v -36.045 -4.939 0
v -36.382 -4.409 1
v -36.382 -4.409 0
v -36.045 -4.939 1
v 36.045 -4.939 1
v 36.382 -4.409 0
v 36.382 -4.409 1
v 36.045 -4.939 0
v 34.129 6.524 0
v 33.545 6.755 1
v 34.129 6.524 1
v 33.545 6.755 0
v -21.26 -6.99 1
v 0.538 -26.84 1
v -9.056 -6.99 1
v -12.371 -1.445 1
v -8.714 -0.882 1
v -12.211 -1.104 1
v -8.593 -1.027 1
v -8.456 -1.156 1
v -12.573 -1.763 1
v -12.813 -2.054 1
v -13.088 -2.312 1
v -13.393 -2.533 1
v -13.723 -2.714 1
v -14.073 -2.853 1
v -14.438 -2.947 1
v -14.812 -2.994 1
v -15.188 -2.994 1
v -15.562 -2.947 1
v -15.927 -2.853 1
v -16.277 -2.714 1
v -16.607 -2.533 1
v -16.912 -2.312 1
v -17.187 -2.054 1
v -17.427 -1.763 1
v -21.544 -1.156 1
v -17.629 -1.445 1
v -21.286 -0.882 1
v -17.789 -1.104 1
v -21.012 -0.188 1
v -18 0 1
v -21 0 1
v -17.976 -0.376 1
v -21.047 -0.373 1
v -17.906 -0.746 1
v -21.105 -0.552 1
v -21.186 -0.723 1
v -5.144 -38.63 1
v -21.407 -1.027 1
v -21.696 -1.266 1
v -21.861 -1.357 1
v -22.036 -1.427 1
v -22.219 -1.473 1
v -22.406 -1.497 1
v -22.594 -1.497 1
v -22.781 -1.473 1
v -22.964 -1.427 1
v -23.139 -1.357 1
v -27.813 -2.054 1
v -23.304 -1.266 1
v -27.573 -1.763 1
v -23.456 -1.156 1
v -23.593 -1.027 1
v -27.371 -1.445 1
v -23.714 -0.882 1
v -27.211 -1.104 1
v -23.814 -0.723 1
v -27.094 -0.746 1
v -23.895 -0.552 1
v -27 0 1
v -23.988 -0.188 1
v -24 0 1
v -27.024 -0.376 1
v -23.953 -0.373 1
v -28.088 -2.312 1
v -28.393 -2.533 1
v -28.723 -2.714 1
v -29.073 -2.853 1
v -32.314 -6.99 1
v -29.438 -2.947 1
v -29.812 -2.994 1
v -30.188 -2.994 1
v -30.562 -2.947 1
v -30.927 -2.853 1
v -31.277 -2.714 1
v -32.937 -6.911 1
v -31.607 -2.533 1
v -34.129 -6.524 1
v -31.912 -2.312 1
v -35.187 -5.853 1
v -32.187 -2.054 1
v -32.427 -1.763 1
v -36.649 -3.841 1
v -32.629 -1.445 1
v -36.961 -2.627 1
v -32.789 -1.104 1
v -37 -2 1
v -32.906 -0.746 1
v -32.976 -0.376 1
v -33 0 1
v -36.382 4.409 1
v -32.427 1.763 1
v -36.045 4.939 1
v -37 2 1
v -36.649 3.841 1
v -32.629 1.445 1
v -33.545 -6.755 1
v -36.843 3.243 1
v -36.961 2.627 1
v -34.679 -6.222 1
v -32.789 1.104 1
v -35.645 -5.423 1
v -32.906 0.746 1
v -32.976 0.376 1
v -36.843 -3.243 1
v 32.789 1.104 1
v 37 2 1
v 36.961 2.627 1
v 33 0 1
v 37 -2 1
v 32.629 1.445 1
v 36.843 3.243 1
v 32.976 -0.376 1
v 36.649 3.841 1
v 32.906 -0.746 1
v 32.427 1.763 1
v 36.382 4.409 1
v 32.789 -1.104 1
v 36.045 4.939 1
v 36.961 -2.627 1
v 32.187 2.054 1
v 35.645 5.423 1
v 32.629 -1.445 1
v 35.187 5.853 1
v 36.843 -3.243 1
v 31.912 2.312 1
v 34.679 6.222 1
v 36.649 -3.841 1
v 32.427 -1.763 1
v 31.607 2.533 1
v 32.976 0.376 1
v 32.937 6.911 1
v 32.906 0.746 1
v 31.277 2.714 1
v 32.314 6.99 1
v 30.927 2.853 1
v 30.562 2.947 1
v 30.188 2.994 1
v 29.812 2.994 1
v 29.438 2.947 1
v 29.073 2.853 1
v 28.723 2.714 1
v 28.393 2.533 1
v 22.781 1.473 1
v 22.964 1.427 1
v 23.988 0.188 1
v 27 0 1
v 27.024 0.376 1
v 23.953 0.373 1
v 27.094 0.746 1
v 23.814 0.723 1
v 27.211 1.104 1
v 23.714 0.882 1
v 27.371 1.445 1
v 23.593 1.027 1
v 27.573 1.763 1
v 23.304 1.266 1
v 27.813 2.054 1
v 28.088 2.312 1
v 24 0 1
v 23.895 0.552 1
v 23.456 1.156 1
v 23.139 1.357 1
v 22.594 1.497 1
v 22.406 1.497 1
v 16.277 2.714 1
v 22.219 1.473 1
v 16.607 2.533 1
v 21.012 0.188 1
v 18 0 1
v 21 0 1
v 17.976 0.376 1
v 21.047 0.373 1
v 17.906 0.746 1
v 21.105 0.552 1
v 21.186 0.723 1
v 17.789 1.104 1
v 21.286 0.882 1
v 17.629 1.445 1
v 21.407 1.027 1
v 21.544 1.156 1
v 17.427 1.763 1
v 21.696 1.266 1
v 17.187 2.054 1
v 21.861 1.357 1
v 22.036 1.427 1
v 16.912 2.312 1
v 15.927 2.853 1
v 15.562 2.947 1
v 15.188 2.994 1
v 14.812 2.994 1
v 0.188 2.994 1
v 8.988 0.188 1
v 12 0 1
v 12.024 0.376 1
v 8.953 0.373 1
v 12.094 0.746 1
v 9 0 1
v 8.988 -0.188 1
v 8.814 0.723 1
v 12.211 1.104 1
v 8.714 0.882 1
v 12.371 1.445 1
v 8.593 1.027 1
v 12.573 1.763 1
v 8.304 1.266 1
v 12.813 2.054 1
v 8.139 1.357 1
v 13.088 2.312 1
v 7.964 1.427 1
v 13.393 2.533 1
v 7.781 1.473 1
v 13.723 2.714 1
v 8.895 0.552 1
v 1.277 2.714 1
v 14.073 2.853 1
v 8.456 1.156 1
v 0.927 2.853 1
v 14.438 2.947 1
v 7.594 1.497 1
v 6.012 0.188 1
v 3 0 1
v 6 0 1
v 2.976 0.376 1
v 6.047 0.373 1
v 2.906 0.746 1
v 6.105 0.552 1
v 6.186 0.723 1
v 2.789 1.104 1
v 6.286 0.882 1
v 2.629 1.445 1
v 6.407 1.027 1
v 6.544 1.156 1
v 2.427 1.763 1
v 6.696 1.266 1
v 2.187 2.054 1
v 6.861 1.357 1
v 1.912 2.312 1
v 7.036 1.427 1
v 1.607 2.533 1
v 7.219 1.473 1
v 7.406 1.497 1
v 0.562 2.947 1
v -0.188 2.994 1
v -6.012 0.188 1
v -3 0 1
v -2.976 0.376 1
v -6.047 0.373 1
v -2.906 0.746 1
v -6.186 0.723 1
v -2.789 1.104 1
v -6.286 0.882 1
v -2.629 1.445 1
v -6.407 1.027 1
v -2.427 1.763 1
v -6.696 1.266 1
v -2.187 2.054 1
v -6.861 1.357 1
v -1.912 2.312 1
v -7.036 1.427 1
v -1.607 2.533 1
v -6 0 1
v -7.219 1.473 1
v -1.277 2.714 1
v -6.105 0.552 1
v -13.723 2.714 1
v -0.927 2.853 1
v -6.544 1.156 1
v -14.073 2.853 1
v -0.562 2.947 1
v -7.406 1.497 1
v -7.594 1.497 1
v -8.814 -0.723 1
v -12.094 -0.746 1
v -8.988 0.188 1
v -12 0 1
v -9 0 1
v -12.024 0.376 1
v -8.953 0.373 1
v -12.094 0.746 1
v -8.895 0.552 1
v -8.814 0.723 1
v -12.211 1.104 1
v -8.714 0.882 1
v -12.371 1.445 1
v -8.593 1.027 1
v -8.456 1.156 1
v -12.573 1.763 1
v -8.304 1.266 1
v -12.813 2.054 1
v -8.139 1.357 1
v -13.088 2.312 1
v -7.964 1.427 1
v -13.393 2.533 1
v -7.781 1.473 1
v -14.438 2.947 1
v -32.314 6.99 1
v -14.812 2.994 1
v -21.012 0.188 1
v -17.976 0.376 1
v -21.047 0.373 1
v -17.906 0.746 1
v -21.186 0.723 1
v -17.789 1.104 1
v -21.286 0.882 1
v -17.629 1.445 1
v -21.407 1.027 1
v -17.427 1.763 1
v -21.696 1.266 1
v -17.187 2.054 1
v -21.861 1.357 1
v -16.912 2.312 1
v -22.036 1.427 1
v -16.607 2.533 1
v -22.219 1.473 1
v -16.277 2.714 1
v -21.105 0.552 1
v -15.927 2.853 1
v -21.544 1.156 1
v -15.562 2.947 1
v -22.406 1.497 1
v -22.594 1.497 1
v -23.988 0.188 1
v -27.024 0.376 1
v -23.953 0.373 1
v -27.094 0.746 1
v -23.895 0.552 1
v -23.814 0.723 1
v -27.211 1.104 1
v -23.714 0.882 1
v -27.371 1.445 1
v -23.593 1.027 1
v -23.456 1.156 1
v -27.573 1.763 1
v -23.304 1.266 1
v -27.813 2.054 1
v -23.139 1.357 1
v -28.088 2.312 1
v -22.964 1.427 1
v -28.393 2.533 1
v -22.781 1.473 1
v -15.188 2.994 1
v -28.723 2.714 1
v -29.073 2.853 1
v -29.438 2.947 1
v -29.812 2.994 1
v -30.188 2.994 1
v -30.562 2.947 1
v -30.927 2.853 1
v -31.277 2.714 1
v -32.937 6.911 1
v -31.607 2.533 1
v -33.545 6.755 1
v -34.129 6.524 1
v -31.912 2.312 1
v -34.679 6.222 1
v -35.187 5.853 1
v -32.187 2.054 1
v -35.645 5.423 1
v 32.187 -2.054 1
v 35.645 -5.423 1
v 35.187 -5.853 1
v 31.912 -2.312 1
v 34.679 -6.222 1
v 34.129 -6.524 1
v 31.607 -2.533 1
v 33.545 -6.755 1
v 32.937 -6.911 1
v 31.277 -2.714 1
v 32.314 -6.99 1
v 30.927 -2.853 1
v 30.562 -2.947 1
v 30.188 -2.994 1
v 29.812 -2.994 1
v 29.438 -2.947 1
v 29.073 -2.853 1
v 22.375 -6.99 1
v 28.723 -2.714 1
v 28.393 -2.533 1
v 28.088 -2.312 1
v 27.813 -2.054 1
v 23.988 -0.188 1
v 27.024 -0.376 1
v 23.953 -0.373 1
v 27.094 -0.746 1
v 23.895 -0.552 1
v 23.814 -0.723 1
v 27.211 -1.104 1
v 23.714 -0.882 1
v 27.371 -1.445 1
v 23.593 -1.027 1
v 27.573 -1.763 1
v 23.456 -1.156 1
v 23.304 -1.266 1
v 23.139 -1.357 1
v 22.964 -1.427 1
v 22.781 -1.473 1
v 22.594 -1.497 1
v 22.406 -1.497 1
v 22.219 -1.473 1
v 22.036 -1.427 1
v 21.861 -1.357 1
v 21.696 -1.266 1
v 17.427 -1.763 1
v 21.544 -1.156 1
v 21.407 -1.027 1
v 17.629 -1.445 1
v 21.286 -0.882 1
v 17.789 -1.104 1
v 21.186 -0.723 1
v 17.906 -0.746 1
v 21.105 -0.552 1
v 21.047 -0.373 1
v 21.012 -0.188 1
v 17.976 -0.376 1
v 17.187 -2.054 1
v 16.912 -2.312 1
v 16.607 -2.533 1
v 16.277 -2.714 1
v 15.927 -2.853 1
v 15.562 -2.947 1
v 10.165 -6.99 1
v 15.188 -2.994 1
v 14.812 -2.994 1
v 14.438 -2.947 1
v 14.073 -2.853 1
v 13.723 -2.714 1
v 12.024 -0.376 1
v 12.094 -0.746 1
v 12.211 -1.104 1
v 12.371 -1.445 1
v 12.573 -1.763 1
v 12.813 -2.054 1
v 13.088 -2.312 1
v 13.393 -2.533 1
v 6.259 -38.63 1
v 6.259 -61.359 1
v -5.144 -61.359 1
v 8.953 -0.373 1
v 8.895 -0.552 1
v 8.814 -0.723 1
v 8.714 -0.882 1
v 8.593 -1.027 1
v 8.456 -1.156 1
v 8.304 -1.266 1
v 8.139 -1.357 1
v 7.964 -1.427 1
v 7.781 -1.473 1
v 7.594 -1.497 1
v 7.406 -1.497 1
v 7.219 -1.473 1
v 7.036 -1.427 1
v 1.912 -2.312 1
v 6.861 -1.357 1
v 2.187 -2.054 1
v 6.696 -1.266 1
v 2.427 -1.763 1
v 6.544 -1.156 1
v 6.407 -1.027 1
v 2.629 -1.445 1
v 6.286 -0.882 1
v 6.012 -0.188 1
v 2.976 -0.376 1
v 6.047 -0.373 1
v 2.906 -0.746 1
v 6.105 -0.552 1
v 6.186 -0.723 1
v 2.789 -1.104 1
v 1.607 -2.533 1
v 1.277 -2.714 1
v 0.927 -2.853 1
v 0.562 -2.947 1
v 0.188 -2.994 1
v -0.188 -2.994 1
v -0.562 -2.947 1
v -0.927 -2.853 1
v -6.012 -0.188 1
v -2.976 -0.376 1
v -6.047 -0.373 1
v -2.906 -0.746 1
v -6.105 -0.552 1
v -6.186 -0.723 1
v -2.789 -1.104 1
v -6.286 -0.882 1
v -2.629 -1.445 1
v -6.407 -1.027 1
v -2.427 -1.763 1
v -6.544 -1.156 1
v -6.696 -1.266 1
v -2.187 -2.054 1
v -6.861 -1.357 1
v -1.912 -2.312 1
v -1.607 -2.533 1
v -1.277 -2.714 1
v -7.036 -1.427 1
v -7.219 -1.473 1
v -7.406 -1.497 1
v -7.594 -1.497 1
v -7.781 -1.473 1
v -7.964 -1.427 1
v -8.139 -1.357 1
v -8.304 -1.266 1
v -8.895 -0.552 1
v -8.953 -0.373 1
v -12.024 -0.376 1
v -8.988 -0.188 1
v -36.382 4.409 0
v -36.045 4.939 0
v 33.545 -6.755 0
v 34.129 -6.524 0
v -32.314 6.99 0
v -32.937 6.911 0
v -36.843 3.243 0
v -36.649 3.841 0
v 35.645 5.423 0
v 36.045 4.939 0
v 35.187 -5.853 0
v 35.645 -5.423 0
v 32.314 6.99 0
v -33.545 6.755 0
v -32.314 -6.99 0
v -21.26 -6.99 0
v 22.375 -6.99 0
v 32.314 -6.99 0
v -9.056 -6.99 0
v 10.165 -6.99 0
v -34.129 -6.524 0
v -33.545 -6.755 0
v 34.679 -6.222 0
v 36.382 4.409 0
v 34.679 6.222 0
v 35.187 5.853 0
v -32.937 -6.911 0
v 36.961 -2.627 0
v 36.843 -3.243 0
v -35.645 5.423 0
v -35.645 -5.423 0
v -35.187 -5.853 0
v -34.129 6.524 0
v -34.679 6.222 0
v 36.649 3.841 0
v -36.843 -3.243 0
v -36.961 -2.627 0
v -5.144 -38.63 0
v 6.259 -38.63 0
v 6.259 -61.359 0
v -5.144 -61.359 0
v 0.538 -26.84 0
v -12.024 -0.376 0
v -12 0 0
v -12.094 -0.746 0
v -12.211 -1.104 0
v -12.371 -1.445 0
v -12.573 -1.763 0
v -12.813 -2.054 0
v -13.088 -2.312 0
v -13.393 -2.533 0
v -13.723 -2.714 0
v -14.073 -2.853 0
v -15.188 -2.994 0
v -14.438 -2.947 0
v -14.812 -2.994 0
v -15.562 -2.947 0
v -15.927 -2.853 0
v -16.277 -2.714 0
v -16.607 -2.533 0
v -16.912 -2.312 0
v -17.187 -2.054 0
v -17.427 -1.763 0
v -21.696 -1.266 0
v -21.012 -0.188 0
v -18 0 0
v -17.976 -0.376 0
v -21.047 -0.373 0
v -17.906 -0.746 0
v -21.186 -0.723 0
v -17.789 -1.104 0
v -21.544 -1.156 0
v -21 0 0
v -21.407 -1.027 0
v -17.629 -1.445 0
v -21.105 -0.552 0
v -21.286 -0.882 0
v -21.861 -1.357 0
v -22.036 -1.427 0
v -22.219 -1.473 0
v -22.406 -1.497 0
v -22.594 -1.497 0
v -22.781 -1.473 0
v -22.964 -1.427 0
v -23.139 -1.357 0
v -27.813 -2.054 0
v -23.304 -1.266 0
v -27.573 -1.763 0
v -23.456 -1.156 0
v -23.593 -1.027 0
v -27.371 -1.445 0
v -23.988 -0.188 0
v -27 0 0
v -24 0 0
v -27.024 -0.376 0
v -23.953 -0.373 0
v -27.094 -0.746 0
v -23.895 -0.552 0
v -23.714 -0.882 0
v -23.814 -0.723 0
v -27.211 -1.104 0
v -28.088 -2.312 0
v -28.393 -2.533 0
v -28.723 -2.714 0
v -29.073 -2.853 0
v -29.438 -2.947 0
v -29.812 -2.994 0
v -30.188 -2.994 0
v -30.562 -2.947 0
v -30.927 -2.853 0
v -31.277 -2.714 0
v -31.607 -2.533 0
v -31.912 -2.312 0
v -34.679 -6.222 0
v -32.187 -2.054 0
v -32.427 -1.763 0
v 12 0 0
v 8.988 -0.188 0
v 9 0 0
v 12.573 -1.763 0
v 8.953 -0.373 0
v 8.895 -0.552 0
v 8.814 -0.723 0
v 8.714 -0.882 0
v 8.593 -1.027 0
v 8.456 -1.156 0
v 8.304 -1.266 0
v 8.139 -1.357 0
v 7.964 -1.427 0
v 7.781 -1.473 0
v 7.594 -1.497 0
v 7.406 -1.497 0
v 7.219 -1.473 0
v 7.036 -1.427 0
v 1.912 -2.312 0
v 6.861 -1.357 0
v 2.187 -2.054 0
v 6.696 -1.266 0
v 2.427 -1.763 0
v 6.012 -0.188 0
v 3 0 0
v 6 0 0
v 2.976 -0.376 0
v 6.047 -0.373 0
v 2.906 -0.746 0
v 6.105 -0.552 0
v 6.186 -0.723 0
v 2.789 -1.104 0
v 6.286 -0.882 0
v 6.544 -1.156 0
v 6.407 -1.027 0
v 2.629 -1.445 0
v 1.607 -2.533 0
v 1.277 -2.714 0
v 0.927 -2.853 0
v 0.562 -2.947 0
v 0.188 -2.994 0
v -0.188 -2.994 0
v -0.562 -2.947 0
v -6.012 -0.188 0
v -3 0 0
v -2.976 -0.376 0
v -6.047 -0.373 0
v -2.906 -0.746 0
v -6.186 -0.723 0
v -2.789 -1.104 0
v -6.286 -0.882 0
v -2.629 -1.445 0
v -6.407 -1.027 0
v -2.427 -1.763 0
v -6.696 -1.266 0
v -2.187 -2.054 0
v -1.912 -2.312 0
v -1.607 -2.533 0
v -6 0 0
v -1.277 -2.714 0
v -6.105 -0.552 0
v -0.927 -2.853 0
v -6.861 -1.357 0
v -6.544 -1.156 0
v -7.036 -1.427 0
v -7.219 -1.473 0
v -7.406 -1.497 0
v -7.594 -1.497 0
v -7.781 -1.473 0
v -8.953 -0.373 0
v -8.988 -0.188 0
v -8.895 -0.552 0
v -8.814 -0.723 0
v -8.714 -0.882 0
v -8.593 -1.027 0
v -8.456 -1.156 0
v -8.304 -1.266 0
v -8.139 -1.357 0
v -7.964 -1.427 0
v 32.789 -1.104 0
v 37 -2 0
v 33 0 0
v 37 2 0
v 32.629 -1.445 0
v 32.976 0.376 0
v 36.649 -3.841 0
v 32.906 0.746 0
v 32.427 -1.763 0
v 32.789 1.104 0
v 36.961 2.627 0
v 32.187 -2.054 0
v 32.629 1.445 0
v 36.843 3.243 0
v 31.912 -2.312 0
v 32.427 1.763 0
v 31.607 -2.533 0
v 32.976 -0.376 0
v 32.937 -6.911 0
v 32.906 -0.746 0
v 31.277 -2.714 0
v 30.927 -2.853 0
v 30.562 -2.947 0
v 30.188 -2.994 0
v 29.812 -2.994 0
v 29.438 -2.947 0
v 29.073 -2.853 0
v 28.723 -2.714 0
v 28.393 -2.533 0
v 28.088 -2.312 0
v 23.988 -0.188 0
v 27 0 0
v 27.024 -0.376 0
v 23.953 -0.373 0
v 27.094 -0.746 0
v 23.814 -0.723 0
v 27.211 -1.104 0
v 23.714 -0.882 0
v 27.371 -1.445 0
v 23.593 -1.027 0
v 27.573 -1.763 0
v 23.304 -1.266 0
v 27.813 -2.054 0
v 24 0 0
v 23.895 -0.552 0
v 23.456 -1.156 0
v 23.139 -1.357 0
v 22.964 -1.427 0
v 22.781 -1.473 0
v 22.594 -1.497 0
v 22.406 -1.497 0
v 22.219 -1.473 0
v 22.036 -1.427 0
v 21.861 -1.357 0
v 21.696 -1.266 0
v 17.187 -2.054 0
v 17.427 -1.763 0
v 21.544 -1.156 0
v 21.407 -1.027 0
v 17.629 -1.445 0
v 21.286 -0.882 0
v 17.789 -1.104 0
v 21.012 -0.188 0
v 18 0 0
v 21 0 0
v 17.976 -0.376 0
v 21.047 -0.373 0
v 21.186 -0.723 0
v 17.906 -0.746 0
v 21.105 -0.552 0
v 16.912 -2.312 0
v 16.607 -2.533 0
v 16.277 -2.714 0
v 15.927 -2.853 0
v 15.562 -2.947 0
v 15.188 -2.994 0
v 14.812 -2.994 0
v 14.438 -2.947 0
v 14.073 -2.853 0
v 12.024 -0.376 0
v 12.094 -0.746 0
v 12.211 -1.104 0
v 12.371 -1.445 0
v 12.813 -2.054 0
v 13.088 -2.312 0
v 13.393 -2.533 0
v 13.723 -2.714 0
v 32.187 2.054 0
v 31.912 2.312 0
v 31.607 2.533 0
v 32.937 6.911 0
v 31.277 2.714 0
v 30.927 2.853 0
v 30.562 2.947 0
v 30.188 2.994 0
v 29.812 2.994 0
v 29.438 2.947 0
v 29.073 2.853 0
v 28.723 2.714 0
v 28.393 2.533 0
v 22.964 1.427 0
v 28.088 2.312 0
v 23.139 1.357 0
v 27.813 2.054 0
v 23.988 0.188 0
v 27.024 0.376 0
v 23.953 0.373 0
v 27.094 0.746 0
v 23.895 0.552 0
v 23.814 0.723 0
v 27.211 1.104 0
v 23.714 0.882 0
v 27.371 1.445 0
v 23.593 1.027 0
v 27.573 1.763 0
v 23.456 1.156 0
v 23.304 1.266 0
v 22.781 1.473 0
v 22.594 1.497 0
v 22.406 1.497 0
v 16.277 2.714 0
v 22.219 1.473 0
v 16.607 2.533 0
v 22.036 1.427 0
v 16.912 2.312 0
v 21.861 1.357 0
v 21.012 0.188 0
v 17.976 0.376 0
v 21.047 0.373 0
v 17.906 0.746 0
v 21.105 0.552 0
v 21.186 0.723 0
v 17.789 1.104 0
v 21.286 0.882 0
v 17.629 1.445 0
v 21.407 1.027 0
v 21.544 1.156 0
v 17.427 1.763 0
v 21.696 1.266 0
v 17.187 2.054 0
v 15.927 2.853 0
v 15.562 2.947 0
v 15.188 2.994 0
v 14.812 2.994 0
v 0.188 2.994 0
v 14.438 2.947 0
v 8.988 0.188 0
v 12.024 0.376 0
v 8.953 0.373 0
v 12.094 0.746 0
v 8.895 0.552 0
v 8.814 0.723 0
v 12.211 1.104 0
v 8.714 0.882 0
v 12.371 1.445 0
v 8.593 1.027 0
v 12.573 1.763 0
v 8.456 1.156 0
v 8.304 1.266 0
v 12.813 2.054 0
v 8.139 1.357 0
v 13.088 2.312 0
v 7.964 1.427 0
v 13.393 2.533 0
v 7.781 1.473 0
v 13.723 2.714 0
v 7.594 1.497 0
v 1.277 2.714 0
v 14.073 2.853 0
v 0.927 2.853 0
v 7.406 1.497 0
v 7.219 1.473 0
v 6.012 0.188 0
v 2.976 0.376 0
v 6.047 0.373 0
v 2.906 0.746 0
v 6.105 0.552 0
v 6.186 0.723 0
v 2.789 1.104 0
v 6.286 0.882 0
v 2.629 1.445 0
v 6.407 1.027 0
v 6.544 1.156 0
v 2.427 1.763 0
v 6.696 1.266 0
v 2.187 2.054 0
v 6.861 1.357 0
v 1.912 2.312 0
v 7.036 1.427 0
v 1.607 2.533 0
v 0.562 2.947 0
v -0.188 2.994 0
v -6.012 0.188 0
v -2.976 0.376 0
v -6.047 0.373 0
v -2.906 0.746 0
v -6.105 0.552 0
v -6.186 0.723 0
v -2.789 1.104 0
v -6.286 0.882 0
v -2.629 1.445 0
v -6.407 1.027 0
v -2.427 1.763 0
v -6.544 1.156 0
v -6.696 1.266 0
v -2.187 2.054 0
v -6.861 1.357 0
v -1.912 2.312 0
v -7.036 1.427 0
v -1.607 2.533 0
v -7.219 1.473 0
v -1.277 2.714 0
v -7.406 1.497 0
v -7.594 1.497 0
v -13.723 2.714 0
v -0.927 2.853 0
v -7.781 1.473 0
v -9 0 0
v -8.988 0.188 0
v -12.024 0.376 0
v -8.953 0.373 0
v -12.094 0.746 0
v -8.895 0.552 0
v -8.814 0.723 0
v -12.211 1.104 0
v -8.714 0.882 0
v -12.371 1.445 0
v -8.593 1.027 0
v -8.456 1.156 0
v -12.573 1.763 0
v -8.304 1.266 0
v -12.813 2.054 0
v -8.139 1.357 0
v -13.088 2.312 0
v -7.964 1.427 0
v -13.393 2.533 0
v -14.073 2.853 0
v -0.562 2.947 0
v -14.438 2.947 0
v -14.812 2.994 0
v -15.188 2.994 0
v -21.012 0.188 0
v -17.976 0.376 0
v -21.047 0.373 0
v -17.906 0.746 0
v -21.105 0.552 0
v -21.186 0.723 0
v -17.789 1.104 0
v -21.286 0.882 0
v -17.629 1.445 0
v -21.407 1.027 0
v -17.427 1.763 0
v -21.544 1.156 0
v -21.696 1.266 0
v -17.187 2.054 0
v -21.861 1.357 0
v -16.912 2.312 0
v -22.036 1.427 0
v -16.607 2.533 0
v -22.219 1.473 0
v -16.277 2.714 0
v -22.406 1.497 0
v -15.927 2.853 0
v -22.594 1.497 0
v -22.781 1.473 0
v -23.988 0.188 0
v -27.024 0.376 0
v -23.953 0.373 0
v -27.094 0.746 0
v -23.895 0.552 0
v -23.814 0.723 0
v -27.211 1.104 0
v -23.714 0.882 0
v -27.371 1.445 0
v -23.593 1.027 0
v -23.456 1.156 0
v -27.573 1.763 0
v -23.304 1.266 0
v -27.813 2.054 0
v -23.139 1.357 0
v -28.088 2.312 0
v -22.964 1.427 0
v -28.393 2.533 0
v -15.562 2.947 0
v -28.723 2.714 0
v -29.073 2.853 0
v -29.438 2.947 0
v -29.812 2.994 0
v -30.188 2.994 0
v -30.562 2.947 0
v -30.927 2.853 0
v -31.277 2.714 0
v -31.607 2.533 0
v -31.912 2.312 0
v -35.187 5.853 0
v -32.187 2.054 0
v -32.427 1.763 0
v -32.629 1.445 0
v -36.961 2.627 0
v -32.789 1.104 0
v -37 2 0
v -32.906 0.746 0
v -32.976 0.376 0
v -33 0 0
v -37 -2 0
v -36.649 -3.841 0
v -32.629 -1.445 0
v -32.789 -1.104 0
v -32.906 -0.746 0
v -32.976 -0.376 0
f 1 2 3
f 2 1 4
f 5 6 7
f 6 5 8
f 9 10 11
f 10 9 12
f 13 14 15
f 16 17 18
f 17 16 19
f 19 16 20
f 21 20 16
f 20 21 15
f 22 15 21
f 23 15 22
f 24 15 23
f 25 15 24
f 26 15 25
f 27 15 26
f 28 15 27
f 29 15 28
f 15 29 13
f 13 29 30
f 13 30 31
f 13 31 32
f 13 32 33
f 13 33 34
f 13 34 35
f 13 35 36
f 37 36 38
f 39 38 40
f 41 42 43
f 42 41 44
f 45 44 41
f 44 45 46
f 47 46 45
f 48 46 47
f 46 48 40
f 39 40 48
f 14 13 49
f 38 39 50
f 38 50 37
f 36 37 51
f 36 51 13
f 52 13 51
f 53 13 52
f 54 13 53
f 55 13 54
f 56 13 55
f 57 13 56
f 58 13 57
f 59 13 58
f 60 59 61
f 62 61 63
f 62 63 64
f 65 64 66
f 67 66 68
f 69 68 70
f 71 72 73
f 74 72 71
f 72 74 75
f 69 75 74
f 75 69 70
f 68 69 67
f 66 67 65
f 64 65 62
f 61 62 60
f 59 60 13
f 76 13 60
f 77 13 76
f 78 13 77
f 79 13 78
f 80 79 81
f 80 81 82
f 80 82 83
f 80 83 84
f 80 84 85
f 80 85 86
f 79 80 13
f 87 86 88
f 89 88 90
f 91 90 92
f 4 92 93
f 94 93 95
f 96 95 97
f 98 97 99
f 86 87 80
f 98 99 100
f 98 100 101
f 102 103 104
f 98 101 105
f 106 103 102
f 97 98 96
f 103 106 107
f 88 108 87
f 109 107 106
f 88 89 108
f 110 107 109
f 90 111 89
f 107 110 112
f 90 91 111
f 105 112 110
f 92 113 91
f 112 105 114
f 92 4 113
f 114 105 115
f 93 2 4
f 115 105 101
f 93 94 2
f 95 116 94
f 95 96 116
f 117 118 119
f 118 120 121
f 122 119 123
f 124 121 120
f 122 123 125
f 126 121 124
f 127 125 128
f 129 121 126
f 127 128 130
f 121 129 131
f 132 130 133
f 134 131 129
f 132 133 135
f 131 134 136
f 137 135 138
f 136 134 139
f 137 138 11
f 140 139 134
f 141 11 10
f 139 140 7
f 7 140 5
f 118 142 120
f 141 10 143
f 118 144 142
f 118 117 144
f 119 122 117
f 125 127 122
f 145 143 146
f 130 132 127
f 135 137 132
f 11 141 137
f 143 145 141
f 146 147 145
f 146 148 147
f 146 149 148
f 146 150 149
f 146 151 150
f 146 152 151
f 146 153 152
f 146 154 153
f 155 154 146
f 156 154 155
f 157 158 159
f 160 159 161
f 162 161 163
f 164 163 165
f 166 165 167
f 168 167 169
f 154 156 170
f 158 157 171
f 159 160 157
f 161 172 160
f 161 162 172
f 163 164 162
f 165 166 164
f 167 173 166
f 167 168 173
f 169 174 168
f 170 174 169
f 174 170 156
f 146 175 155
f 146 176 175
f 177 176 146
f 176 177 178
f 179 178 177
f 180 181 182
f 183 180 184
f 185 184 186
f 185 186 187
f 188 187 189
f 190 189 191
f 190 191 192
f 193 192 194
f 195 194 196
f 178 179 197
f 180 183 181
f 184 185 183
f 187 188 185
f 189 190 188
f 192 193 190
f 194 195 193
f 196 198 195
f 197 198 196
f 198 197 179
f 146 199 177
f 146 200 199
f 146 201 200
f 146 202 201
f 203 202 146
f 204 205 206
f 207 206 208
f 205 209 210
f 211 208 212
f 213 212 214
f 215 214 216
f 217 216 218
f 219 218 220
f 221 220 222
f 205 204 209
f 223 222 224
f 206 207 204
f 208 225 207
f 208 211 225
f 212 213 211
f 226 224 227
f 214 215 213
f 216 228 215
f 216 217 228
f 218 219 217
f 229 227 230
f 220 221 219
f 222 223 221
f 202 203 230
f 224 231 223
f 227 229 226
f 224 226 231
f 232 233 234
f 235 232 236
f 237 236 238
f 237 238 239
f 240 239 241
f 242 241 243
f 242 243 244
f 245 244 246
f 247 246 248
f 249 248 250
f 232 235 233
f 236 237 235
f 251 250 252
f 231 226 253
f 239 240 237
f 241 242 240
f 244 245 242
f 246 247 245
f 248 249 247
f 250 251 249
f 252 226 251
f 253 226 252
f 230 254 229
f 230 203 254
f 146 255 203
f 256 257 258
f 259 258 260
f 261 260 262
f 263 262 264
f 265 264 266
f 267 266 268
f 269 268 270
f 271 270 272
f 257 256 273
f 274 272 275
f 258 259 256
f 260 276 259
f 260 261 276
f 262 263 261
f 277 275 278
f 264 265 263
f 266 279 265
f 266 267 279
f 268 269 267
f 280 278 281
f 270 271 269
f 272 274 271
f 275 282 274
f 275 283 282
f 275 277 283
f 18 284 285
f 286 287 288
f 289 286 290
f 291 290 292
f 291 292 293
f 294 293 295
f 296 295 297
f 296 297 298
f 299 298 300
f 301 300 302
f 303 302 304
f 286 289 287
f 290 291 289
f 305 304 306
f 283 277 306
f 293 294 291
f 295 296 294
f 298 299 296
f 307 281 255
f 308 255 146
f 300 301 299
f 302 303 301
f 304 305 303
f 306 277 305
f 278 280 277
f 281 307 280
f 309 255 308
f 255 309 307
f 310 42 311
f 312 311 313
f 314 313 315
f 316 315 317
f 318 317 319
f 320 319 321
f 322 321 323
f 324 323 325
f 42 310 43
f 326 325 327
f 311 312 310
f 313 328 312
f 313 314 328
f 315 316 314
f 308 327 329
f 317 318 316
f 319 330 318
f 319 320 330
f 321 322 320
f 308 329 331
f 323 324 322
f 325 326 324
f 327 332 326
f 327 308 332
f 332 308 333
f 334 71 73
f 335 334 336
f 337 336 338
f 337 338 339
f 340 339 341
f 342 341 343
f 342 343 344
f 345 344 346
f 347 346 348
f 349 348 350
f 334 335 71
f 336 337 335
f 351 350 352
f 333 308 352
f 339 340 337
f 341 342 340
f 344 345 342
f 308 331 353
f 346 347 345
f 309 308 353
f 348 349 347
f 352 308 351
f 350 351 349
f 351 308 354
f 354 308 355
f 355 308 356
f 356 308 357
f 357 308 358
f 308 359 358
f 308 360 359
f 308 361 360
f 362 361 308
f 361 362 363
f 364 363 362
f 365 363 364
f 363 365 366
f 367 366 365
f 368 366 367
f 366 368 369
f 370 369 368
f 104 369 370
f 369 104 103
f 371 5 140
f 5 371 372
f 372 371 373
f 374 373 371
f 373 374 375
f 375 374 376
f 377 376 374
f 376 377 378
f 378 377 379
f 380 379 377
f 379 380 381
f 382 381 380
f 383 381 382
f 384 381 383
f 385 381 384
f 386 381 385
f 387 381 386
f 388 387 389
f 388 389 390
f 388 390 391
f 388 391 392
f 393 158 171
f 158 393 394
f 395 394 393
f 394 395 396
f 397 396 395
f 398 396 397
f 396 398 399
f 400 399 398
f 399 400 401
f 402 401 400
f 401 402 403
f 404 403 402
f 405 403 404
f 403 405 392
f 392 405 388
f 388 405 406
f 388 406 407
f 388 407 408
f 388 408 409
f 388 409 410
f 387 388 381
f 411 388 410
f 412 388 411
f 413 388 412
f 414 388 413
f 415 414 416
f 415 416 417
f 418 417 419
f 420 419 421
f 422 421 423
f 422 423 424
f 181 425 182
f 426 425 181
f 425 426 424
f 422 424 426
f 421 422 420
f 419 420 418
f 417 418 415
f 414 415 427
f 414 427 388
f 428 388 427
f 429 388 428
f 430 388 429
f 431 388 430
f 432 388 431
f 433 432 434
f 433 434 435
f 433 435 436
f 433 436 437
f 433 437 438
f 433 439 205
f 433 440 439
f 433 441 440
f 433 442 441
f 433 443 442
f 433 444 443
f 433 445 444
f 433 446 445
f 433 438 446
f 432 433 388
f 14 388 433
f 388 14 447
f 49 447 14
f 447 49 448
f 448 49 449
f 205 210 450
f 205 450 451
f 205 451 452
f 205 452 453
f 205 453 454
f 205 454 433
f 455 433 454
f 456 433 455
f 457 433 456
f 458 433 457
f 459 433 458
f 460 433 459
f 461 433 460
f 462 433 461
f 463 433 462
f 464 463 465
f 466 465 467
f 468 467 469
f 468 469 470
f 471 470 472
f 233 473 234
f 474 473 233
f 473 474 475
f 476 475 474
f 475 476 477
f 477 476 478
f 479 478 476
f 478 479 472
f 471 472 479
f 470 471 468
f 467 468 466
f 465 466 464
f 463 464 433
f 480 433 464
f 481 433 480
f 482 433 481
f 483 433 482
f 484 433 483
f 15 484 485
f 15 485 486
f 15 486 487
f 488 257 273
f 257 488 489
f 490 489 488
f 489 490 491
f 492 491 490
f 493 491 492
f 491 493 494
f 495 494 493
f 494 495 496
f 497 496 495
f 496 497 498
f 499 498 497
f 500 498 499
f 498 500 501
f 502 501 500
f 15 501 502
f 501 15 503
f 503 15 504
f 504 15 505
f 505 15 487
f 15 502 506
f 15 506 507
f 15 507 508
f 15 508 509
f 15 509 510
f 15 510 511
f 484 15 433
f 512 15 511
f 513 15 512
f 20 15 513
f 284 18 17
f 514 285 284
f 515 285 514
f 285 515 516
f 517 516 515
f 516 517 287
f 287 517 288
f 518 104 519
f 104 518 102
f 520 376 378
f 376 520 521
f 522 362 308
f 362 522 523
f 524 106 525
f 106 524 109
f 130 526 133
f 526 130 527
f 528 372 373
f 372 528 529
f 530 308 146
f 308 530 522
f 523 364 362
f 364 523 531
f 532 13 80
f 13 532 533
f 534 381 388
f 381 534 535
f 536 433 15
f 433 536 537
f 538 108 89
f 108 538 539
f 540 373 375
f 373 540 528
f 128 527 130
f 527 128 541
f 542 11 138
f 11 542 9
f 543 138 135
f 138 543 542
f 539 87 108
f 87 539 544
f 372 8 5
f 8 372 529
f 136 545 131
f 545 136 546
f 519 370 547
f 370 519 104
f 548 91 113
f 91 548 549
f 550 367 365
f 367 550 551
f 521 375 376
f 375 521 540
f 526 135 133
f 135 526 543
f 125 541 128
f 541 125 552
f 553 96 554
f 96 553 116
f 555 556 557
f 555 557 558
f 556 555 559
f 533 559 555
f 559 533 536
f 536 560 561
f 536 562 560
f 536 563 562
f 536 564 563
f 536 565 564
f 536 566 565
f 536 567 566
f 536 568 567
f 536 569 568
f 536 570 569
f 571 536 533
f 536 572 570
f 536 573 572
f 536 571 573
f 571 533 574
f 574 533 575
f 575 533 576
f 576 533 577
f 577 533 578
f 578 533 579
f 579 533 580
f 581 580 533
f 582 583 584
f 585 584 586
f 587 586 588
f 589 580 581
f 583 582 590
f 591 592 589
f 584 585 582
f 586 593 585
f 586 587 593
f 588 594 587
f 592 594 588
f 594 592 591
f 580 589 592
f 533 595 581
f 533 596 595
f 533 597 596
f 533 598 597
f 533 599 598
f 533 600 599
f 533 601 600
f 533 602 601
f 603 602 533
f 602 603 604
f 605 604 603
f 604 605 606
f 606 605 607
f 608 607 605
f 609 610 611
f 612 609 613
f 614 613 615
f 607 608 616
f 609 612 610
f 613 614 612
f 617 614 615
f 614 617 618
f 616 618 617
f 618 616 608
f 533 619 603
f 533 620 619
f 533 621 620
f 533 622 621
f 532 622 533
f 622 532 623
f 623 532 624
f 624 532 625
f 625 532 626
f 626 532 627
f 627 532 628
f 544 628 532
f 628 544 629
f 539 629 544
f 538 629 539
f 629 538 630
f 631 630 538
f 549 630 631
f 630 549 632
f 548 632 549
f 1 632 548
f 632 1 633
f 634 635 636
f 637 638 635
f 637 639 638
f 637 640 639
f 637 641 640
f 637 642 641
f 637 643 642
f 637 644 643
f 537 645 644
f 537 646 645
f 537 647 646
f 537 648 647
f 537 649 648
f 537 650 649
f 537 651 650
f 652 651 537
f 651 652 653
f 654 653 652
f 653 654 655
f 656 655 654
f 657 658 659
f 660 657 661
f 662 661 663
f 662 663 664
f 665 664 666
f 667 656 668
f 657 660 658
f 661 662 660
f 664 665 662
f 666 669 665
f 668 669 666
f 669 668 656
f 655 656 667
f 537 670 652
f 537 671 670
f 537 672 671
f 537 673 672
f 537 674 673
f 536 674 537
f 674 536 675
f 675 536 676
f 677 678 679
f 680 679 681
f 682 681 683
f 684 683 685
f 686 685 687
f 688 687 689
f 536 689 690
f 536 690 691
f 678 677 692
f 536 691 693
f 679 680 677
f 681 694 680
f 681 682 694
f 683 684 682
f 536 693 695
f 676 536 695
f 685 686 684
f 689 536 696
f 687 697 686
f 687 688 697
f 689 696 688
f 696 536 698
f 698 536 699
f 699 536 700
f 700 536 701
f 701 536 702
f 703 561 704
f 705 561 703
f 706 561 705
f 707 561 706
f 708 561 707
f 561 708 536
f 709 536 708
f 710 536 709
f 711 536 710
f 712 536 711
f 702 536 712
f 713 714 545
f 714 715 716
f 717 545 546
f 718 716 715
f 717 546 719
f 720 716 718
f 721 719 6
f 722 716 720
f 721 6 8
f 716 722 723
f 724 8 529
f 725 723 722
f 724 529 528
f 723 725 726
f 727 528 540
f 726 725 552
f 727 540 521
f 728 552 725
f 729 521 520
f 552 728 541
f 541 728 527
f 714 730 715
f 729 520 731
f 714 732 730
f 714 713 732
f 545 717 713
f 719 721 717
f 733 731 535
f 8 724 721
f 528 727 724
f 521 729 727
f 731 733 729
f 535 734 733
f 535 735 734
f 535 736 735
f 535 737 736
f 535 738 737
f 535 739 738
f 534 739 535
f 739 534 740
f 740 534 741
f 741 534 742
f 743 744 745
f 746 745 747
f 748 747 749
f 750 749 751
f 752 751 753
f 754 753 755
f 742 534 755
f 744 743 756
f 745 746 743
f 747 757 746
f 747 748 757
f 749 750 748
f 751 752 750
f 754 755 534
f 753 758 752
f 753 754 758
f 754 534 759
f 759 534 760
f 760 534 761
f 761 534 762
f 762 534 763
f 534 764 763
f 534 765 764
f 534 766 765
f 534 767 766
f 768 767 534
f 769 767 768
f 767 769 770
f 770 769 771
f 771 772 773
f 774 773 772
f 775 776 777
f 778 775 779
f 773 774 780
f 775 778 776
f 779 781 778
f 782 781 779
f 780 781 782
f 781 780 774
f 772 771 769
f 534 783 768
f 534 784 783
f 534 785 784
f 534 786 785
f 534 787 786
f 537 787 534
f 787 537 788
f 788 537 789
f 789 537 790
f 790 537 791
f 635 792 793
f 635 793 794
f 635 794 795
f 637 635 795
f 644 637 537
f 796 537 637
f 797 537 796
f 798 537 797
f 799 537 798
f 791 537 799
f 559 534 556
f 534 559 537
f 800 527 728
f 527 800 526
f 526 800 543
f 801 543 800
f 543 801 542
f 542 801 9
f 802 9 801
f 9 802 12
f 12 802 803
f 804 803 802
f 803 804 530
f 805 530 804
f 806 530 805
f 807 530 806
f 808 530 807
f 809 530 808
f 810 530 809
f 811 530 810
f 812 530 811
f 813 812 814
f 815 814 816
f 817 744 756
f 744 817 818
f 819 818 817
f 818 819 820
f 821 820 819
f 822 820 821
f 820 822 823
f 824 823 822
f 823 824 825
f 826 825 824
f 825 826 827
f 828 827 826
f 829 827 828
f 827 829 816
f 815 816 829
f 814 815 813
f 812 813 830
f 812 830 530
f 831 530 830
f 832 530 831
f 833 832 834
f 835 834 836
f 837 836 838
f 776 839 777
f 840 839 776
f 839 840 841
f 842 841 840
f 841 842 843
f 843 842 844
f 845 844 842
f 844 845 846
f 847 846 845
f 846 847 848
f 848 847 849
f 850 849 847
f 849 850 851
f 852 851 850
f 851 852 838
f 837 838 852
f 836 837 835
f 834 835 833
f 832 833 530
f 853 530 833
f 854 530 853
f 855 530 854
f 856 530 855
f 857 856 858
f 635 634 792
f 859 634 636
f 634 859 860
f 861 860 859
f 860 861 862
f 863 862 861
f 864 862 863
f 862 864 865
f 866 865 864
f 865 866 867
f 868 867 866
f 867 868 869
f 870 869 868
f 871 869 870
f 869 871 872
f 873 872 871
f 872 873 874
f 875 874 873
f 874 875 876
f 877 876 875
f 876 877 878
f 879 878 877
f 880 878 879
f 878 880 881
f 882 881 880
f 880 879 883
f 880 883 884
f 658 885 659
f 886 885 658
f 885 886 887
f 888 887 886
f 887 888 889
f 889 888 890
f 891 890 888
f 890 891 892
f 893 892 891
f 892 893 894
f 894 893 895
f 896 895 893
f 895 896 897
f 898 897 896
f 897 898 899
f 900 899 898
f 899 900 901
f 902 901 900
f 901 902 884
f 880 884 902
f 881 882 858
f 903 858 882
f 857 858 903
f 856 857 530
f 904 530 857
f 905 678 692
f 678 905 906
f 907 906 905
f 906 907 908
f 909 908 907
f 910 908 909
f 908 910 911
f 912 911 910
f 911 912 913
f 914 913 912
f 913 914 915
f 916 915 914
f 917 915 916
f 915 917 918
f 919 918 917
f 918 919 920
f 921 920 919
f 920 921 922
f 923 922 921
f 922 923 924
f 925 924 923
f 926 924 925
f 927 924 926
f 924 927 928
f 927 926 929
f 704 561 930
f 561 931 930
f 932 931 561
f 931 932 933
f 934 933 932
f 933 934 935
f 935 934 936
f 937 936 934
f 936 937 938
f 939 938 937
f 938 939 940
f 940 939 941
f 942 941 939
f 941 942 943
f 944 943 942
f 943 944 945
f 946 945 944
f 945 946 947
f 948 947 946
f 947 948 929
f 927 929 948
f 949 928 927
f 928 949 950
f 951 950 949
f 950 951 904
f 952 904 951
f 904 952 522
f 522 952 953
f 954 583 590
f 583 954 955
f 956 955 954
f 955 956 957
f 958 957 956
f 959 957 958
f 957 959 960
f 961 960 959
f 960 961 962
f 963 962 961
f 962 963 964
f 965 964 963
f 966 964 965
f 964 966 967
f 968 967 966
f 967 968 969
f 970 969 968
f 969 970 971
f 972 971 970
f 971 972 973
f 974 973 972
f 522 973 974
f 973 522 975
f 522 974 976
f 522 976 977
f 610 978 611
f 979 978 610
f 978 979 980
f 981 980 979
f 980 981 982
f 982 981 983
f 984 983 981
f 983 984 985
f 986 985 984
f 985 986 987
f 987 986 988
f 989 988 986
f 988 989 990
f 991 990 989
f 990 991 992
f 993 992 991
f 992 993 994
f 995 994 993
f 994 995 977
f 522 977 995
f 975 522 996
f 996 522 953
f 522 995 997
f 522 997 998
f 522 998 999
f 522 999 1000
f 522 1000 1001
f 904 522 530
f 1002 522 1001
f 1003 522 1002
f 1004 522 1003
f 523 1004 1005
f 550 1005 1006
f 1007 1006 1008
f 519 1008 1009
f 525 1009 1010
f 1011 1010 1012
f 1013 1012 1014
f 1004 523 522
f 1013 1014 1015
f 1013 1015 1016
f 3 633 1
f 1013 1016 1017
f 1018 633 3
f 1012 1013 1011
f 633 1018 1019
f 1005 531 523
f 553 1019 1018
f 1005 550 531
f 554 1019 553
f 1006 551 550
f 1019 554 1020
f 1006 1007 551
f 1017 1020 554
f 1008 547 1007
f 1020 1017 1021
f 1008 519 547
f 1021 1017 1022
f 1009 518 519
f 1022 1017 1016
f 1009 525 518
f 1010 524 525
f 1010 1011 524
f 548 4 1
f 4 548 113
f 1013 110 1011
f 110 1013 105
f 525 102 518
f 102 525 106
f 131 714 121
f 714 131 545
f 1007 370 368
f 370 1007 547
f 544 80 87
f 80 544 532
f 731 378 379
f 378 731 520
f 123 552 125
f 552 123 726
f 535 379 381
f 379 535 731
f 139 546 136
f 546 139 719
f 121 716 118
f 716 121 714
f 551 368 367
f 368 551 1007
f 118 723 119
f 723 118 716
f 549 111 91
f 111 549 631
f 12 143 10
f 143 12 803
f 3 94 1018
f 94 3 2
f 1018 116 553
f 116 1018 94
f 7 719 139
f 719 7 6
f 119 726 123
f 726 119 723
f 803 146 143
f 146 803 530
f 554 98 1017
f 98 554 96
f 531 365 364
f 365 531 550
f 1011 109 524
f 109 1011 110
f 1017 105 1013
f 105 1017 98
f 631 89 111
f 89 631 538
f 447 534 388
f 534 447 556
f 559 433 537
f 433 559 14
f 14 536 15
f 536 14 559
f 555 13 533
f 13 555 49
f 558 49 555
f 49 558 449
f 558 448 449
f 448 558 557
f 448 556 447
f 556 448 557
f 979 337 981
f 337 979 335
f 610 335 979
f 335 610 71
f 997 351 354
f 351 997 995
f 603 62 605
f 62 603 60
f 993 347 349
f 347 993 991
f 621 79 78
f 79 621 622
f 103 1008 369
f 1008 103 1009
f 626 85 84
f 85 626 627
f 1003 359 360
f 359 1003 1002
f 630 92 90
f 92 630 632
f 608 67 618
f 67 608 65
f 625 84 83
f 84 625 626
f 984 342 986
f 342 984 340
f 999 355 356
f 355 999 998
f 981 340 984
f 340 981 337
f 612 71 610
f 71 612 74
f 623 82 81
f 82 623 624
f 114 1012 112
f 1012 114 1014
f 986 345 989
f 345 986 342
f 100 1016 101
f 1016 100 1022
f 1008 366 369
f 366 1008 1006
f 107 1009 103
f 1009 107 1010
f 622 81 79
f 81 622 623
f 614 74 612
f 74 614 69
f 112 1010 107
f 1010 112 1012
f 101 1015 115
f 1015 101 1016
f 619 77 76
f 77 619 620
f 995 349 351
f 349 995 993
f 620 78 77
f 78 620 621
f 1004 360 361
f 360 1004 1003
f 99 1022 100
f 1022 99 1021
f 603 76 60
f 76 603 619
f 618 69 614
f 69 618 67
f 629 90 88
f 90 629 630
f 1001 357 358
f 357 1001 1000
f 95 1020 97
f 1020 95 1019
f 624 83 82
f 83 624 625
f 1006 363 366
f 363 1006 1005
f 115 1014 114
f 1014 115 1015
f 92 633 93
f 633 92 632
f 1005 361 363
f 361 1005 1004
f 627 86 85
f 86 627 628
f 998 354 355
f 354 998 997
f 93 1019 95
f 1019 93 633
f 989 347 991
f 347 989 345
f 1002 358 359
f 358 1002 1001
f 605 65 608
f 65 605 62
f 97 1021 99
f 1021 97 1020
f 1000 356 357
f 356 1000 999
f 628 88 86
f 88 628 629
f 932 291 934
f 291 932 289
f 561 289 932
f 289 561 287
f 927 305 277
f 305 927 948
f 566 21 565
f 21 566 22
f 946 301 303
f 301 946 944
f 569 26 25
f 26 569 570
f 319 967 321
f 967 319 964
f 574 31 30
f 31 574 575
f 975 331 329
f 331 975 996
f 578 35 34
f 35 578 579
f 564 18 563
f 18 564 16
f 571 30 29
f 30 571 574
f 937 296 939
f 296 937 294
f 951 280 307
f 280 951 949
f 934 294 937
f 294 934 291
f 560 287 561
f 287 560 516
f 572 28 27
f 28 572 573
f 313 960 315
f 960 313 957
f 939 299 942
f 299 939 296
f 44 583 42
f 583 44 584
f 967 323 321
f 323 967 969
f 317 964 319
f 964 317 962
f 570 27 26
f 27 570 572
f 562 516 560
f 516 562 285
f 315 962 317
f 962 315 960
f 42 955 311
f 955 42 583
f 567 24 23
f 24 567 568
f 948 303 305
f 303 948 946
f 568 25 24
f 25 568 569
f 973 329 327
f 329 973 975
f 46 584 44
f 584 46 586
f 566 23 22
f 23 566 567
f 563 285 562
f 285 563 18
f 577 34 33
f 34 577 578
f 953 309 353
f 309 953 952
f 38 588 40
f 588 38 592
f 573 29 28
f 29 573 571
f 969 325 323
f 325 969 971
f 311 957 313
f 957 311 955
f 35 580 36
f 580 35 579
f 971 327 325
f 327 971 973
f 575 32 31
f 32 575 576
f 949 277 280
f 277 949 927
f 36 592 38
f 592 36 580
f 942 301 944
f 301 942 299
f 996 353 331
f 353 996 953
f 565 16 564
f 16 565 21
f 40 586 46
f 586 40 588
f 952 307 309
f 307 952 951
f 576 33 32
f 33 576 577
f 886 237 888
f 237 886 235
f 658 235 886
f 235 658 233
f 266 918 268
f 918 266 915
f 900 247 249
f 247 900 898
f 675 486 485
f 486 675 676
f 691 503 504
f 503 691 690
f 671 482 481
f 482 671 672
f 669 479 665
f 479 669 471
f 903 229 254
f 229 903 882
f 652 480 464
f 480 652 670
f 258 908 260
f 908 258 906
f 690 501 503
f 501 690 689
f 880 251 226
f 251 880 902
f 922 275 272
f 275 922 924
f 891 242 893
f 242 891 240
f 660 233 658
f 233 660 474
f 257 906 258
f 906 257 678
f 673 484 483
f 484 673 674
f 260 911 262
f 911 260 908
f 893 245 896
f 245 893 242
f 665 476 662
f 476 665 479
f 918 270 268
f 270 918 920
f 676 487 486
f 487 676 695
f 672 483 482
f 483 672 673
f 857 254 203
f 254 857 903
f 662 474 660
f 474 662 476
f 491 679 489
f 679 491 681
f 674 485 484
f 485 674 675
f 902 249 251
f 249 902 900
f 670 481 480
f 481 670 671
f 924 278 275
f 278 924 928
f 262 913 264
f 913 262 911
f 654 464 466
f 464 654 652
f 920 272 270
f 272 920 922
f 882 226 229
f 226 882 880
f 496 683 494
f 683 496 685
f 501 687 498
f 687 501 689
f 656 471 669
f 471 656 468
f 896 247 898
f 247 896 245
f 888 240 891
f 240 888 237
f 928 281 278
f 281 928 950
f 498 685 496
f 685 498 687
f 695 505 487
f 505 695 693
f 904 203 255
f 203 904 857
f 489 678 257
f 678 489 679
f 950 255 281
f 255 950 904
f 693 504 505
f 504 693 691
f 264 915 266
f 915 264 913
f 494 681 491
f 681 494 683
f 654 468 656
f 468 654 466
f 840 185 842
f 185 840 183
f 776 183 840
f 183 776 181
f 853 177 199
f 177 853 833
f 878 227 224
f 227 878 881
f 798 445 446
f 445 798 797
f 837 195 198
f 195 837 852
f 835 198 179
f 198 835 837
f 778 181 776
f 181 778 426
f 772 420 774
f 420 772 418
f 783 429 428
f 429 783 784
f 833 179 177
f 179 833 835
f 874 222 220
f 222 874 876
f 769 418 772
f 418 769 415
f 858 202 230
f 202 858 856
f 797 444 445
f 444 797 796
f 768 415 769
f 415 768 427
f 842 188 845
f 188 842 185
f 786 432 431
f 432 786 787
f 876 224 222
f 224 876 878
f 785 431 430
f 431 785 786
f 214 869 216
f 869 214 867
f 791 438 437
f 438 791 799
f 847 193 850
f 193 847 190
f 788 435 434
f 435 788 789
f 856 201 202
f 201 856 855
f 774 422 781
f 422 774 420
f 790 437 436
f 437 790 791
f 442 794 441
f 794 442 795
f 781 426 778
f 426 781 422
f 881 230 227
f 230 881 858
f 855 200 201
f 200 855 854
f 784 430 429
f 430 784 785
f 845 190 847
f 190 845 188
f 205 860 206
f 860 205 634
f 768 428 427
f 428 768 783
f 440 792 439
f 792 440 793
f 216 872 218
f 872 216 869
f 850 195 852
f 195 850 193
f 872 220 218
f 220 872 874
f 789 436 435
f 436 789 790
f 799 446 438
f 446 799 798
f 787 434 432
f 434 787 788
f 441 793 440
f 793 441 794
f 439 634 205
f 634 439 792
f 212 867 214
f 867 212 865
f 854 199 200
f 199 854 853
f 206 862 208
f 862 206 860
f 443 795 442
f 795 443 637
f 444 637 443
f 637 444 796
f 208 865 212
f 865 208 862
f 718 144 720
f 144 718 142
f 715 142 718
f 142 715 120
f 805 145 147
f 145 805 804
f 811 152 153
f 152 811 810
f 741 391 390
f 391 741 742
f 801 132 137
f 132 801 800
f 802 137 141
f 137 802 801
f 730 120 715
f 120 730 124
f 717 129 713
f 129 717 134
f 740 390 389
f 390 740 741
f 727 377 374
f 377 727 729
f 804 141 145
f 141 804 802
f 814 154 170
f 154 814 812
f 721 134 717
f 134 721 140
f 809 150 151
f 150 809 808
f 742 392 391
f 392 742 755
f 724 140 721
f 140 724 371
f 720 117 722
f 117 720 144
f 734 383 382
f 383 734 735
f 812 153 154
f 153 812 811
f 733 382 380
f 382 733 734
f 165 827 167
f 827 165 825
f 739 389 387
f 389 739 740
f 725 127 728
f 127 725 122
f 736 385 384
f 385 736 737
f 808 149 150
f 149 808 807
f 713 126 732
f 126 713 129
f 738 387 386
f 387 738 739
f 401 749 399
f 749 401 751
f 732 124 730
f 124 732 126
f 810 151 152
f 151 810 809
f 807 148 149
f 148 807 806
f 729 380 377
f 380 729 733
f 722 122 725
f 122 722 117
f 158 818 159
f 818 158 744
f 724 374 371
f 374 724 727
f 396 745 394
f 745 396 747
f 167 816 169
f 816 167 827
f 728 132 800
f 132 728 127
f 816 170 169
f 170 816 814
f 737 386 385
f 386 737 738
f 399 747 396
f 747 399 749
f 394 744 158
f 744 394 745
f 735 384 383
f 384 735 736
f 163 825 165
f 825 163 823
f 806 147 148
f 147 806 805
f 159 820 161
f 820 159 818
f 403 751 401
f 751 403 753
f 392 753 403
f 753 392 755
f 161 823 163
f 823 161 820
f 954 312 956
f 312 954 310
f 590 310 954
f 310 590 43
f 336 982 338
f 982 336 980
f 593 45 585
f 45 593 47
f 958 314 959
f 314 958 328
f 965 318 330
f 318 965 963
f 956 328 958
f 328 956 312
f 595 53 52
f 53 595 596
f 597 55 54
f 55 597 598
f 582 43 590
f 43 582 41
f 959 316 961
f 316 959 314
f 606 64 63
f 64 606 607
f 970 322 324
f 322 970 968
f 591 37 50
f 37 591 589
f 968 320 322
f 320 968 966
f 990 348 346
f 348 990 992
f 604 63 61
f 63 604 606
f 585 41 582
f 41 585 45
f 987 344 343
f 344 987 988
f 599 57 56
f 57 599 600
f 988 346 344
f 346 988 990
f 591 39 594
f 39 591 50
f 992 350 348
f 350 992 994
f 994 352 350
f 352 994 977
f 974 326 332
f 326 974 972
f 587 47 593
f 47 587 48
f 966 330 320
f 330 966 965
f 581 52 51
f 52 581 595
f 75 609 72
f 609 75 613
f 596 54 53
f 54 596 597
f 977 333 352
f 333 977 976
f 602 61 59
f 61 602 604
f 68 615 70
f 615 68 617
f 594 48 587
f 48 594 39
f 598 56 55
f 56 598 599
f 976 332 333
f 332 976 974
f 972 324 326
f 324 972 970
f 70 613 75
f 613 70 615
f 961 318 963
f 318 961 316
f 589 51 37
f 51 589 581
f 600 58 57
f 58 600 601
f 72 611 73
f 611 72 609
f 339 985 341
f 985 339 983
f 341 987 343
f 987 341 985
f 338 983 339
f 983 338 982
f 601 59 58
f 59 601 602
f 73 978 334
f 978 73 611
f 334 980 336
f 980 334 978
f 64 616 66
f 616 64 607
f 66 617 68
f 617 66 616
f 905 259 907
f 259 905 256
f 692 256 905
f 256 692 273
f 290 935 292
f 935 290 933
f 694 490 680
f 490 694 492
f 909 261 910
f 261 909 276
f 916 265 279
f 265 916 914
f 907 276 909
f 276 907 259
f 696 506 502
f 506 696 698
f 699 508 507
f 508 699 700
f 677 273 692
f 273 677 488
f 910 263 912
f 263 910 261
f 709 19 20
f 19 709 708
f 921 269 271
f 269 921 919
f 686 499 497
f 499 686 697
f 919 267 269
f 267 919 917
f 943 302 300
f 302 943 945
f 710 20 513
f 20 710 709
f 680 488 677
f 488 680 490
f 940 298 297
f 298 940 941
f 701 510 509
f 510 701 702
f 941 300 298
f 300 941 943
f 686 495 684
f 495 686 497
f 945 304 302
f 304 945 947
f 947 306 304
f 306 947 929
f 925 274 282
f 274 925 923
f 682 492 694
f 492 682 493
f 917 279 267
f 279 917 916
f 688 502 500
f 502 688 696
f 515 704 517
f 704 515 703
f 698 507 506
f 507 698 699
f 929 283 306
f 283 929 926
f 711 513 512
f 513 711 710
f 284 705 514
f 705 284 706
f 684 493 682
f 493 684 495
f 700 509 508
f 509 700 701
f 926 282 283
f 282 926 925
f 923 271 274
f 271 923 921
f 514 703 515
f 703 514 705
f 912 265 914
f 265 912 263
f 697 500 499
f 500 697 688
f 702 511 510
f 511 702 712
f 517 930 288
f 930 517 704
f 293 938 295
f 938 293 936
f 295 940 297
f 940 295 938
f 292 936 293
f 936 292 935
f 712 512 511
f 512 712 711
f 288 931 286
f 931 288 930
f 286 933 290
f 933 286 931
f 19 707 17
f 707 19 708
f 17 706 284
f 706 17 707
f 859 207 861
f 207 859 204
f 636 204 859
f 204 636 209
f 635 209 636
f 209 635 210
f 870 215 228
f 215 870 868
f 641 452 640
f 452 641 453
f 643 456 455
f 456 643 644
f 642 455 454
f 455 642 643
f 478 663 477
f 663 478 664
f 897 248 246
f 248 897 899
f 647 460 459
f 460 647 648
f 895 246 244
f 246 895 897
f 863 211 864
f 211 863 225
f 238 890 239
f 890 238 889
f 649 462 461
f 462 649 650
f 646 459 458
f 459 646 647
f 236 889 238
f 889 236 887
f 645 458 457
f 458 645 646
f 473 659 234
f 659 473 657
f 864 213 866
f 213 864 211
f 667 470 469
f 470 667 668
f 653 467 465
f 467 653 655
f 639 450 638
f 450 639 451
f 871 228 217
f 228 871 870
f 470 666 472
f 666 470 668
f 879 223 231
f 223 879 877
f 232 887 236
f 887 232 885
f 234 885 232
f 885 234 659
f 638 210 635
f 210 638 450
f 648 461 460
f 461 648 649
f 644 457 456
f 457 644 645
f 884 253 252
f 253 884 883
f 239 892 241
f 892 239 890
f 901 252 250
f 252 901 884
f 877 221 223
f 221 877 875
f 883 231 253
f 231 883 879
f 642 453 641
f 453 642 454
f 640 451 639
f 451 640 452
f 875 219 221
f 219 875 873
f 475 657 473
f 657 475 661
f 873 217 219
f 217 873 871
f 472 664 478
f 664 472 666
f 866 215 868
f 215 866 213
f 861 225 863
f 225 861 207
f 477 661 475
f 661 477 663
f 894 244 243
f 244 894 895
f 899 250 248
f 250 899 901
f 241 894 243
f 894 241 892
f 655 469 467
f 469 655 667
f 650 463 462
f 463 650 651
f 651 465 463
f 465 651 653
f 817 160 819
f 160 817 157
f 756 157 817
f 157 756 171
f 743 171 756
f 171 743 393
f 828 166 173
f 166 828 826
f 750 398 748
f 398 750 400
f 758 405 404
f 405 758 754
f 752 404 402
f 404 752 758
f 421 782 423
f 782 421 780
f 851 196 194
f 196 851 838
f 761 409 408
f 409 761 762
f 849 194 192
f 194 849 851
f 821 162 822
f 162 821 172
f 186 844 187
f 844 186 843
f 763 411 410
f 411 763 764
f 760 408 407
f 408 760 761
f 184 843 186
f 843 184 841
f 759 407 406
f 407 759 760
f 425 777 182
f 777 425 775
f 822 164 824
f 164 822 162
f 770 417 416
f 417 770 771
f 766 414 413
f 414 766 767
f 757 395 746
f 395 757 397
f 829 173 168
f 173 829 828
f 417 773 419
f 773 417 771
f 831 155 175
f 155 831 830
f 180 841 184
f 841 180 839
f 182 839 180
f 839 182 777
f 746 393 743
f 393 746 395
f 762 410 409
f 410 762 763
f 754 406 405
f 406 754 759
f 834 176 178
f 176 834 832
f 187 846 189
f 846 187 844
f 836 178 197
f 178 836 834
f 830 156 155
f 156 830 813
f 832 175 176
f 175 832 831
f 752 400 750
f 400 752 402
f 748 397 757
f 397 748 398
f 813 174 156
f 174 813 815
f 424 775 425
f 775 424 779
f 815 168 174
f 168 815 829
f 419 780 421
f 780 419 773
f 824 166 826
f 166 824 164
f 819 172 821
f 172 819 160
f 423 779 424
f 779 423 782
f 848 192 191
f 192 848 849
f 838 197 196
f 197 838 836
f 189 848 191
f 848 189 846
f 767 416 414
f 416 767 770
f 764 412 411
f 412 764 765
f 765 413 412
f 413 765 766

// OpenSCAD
$fn = 50;


difference() {
	union() {
		hull() {
			translate(v = [-32.0000000000, 2.0000000000, 0]) {
				cylinder(h = 1, r = 5);
			}
			translate(v = [32.0000000000, 2.0000000000, 0]) {
				cylinder(h = 1, r = 5);
			}
			translate(v = [-32.0000000000, -2.0000000000, 0]) {
				cylinder(h = 1, r = 5);
			}
			translate(v = [32.0000000000, -2.0000000000, 0]) {
				cylinder(h = 1, r = 5);
			}
		}
		translate(v = [0, -5, 0]) {
			linear_extrude(height = 1) {
				text(font = "DejaVu Sans Mono:style=Bold", halign = "center", size = 57.0000000000, text = "Y", valign = "top");
			}
		}
	}
	union() {
		translate(v = [-30.0000000000, 0.0000000000, 0]) {
			translate(v = [0, 0, -100]) {
				cylinder(h = 200, r = 3.0000000000);
			}
		}
		translate(v = [-15.0000000000, 0.0000000000, 0]) {
			translate(v = [0, 0, -100]) {
				cylinder(h = 200, r = 3.0000000000);
			}
		}
		translate(v = [0, 0, -100]) {
			cylinder(h = 200, r = 3.0000000000);
		}
		translate(v = [15.0000000000, 0.0000000000, 0]) {
			translate(v = [0, 0, -100]) {
				cylinder(h = 200, r = 3.0000000000);
			}
		}
		translate(v = [30.0000000000, 0.0000000000, 0]) {
			translate(v = [0, 0, -100]) {
				cylinder(h = 200, r = 3.0000000000);
			}
		}
		translate(v = [-30.0000000000, 0.0000000000, 0]) {
			translate(v = [0, 0, -100]) {
				cylinder(h = 200, r = 1.5000000000);
			}
		}
		translate(v = [-22.5000000000, 0.0000000000, 0]) {
			translate(v = [0, 0, -100]) {
				cylinder(h = 200, r = 1.5000000000);
			}
		}
		translate(v = [-15.0000000000, 0.0000000000, 0]) {
			translate(v = [0, 0, -100]) {
				cylinder(h = 200, r = 1.5000000000);
			}
		}
		translate(v = [-7.5000000000, 0.0000000000, 0]) {
			translate(v = [0, 0, -100]) {
				cylinder(h = 200, r = 1.5000000000);
			}
		}
		translate(v = [0, 0, -100]) {
			cylinder(h = 200, r = 1.5000000000);
		}
		translate(v = [7.5000000000, 0.0000000000, 0]) {
			translate(v = [0, 0, -100]) {
				cylinder(h = 200, r = 1.5000000000);
			}
		}
		translate(v = [15.0000000000, 0.0000000000, 0]) {
			translate(v = [0, 0, -100]) {
				cylinder(h = 200, r = 1.5000000000);
			}
		}
		translate(v = [22.5000000000, 0.0000000000, 0]) {
			translate(v = [0, 0, -100]) {
				cylinder(h = 200, r = 1.5000000000);
			}
		}
		translate(v = [30.0000000000, 0.0000000000, 0]) {
			translate(v = [0, 0, -100]) {
				cylinder(h = 200, r = 1.5000000000);
			}
		}
	}
}
